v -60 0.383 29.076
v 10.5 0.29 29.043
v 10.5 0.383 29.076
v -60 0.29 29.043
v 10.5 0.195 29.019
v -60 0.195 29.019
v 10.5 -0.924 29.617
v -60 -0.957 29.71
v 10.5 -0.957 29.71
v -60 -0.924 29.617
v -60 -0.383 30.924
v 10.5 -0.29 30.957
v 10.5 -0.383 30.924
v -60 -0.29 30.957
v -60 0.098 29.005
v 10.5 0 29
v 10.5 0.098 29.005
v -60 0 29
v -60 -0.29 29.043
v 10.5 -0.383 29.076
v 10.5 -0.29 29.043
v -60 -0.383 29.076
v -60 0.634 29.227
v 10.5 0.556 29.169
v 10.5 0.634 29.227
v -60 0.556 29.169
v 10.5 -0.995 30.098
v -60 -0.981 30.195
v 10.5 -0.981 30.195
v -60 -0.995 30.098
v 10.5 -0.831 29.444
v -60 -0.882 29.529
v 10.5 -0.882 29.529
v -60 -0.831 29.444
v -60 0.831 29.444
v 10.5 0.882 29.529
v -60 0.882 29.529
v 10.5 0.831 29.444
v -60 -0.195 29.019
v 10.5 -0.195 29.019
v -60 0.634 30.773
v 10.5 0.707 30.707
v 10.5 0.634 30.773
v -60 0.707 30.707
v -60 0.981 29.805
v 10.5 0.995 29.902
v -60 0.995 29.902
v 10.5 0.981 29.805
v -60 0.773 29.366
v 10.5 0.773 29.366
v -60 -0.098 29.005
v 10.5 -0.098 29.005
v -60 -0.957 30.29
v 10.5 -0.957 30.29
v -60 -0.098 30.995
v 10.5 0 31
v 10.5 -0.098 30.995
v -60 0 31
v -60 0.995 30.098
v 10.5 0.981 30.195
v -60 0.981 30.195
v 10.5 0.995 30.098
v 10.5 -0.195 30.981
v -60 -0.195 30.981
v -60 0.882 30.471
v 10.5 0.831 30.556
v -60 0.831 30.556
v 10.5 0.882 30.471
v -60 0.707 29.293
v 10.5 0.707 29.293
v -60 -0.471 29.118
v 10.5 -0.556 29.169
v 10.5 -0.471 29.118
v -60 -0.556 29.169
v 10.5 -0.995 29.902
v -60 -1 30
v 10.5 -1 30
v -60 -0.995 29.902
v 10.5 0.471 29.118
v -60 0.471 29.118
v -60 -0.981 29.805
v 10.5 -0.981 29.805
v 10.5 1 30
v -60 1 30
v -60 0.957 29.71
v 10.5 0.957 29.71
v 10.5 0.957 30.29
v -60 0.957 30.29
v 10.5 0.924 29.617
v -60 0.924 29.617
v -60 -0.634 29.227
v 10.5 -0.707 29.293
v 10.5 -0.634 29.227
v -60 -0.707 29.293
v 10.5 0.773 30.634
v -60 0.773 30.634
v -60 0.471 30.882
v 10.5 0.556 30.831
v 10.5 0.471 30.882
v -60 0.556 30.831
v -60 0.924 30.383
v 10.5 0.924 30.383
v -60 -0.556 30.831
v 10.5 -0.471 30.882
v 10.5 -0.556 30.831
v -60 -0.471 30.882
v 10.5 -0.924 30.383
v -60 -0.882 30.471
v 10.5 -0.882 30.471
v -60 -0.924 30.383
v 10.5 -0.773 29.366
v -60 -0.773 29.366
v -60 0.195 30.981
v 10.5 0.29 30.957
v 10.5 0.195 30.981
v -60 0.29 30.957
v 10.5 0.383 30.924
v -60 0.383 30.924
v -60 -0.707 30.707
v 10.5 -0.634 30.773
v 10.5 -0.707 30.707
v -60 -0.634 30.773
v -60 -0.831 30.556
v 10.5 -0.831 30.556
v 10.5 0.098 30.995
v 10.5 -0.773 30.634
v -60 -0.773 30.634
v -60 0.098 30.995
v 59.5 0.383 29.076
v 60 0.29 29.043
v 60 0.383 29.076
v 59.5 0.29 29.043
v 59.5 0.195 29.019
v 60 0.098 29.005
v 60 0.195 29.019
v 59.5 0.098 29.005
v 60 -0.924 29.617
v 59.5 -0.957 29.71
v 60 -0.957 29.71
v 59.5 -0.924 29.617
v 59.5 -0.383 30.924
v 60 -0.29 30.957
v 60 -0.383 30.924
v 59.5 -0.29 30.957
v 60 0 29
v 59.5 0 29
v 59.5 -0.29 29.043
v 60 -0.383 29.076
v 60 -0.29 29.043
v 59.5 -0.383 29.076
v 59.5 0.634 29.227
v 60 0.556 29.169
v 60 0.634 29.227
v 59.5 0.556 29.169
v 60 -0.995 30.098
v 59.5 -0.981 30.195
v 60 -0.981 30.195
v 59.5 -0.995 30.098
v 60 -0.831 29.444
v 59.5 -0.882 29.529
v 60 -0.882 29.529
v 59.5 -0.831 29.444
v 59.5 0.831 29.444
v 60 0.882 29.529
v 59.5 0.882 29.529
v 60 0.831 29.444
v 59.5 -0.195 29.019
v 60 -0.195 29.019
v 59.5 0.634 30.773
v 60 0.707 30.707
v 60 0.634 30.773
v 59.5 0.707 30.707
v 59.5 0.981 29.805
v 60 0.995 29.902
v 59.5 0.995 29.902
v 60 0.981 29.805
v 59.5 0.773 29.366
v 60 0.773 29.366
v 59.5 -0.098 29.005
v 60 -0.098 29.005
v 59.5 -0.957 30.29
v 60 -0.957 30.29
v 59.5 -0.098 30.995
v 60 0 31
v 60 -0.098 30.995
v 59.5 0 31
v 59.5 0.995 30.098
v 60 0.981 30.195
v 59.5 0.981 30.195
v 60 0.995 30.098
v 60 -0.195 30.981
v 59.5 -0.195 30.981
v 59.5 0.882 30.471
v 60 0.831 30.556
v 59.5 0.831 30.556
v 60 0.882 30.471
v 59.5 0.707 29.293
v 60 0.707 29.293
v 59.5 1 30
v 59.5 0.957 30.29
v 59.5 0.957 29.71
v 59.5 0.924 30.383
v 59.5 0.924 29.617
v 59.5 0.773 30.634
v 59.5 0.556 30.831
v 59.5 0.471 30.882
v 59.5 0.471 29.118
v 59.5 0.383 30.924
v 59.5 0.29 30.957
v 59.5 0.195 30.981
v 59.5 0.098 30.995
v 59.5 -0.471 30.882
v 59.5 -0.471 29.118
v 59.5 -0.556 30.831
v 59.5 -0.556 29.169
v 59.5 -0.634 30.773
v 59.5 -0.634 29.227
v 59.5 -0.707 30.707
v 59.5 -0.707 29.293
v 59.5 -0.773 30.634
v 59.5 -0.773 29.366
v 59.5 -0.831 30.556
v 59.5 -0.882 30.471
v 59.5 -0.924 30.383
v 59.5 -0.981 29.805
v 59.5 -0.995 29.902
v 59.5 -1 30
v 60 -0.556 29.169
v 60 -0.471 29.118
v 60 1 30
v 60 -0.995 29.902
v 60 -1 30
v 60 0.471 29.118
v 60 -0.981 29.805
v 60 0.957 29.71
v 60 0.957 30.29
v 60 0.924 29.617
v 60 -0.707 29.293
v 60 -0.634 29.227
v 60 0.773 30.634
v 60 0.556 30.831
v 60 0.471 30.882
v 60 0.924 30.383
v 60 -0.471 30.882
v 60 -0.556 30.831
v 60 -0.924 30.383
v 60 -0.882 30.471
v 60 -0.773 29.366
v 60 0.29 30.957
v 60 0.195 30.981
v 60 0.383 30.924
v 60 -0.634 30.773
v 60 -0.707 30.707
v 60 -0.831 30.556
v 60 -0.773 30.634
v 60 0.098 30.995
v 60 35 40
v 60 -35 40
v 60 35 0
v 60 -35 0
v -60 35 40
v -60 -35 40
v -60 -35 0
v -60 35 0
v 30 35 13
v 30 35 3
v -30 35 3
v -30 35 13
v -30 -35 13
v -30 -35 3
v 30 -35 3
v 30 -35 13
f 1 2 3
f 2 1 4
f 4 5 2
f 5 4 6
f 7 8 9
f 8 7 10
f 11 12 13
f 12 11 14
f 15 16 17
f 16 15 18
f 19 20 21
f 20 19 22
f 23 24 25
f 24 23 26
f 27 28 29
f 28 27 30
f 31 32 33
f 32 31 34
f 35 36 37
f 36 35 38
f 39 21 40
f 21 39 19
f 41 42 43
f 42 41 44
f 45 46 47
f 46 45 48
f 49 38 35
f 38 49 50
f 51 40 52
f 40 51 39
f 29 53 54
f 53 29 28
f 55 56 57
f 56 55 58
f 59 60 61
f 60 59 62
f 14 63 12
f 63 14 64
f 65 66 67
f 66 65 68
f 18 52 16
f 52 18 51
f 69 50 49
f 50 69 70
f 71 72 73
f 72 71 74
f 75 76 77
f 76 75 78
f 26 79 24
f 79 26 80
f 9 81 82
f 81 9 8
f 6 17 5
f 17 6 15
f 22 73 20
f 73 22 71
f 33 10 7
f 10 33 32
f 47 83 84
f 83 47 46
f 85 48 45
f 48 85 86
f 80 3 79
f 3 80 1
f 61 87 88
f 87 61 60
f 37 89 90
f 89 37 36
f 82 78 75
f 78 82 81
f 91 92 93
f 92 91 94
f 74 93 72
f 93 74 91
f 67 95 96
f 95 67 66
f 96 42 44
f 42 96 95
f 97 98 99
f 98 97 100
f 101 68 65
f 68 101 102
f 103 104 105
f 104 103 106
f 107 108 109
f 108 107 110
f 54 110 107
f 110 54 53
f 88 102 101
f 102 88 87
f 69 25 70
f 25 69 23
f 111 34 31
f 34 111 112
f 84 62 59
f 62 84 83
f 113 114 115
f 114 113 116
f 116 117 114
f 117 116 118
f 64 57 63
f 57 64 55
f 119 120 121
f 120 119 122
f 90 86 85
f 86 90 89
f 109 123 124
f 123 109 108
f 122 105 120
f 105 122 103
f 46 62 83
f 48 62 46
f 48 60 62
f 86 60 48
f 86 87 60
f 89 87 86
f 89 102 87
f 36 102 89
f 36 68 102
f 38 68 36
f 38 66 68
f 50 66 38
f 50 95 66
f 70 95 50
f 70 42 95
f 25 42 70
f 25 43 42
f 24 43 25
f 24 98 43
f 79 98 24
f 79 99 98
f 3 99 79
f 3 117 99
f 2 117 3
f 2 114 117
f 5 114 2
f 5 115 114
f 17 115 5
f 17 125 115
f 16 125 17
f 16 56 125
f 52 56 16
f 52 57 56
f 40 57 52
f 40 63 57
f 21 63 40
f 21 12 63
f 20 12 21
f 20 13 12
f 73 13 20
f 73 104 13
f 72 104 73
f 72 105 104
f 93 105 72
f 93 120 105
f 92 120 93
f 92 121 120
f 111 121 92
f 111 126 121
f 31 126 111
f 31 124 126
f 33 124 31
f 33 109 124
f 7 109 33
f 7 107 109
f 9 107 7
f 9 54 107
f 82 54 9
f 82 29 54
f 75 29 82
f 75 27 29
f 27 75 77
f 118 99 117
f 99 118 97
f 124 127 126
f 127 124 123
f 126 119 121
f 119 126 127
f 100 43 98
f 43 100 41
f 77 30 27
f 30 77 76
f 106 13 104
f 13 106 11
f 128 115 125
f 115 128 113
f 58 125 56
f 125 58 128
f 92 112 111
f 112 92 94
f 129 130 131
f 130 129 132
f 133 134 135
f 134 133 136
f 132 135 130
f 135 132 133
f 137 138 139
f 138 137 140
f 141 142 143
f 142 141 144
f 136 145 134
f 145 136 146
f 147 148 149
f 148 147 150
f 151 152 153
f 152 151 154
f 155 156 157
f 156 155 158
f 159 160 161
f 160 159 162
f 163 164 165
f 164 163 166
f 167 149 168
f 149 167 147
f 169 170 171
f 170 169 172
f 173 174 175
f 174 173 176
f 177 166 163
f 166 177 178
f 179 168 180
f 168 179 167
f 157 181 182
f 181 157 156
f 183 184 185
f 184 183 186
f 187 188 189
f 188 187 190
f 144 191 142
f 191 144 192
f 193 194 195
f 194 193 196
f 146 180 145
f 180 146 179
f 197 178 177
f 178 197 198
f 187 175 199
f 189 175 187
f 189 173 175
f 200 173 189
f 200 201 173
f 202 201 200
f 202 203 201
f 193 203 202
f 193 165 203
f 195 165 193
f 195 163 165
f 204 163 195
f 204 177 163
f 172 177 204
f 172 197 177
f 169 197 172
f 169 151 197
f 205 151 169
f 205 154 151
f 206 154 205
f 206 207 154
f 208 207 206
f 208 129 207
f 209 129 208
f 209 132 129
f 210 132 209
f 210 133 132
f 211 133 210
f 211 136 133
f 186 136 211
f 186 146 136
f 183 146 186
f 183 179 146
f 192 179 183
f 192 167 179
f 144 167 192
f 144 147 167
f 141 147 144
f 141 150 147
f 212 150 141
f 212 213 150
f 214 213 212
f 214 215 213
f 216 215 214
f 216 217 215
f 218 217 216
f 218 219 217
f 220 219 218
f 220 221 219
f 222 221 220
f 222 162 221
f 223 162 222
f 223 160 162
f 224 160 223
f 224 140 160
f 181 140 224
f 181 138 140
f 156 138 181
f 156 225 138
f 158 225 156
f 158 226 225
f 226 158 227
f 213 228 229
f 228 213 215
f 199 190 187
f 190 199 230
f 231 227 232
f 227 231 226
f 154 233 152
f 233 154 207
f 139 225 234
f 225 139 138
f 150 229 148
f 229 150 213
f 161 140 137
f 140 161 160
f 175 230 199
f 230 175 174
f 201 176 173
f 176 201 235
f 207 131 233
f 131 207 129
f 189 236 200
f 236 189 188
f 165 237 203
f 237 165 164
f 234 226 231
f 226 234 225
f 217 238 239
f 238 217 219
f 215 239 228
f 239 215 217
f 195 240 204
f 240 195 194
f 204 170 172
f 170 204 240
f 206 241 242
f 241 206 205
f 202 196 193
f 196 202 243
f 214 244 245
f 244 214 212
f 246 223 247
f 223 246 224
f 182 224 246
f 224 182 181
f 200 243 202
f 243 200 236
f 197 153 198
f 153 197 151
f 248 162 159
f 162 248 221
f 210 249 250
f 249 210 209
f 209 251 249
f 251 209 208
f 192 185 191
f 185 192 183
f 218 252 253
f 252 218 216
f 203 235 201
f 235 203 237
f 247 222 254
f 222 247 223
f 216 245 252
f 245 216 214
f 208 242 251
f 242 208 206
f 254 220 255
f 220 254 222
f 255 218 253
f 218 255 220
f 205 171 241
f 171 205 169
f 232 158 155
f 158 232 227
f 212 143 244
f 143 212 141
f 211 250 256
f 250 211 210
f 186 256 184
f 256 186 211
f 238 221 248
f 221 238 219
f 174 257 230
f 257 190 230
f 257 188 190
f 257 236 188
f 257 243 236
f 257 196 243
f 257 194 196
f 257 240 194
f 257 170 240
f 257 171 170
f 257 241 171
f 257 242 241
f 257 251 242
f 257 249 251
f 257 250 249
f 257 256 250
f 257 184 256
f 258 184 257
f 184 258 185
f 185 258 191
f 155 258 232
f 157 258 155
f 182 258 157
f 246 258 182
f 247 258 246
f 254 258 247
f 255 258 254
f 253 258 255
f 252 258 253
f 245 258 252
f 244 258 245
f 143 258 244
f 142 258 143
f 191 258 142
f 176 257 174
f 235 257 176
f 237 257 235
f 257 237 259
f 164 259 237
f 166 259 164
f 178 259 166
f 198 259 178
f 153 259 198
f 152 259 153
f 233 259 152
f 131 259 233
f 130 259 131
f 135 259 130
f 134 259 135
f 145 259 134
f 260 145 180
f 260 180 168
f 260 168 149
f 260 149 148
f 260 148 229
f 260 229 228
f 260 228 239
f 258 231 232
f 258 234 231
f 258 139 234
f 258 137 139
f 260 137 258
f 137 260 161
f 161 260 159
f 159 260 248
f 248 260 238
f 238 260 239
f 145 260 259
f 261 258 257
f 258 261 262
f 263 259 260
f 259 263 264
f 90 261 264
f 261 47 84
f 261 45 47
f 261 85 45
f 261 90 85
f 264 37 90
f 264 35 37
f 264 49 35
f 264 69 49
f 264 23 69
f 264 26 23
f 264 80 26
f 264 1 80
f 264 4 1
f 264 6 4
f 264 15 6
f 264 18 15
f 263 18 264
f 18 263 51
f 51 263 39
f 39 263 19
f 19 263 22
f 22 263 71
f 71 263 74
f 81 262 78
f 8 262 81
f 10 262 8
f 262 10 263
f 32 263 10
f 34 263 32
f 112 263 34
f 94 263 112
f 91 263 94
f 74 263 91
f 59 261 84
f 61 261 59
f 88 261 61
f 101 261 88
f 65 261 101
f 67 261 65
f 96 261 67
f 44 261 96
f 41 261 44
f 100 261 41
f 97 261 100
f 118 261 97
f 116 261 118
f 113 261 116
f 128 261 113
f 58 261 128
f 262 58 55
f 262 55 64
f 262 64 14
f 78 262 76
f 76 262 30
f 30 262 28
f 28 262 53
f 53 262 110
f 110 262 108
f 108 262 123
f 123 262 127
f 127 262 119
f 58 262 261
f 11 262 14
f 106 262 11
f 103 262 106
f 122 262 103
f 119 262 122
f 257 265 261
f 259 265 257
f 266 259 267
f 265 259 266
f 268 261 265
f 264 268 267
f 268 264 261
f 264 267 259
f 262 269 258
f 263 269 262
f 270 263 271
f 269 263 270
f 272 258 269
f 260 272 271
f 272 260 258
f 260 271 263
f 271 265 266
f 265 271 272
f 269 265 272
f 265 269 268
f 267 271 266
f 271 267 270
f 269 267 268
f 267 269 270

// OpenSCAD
// Mini horizontal gel-electrophoresis buffer tank
// Print orientation: base on XY plane, open top at z = 40

// ---- Tank dimensions ----
outer_x = 120;   // outer length along X
outer_y = 70;    // outer width along Y
height  = 40;    // overall height along Z
wall    = 3;     // wall thickness
floor   = 3;     // floor thickness

// ---- Platform dimensions ----
platform_len   = 60;   // platform length along X
platform_top_z = 13;   // platform top height (10 mm above inner floor)

// ---- Electrode holes ----
hole_d = 2;     // hole diameter
hole_y = 0;     // hole Y position
hole_z = 30;    // hole Z position

// ---- Modelling helpers ----
eps = 0.5;       // cutter overshoot past faces
$fn = 64;        // curve resolution

// ---- Derived ----
inner_h = height - floor;              // inner floor to open top
platform_h = platform_top_z - floor;   // platform height above floor

difference() {
    // Main tank body
    translate([-outer_x/2, -outer_y/2, 0])
        cube([outer_x, outer_y, height]);

    // Raised platform in the middle (spans full inner width)
    translate([-outer_x/2 + (outer_x - platform_len)/2,
               -outer_y/2,
               floor])
        cube([platform_len, outer_y, platform_h]);

    // Horizontal electrode holes through each end wall along X
    for (sx = [-1, 1])
        translate([sx > 0 ? outer_x/2 - eps : -outer_x/2 - eps,
                   hole_y,
                   hole_z])
            rotate([0, 90, 0])
                cylinder(d = hole_d, h = outer_y + 2*eps, $fn = 64);
}
